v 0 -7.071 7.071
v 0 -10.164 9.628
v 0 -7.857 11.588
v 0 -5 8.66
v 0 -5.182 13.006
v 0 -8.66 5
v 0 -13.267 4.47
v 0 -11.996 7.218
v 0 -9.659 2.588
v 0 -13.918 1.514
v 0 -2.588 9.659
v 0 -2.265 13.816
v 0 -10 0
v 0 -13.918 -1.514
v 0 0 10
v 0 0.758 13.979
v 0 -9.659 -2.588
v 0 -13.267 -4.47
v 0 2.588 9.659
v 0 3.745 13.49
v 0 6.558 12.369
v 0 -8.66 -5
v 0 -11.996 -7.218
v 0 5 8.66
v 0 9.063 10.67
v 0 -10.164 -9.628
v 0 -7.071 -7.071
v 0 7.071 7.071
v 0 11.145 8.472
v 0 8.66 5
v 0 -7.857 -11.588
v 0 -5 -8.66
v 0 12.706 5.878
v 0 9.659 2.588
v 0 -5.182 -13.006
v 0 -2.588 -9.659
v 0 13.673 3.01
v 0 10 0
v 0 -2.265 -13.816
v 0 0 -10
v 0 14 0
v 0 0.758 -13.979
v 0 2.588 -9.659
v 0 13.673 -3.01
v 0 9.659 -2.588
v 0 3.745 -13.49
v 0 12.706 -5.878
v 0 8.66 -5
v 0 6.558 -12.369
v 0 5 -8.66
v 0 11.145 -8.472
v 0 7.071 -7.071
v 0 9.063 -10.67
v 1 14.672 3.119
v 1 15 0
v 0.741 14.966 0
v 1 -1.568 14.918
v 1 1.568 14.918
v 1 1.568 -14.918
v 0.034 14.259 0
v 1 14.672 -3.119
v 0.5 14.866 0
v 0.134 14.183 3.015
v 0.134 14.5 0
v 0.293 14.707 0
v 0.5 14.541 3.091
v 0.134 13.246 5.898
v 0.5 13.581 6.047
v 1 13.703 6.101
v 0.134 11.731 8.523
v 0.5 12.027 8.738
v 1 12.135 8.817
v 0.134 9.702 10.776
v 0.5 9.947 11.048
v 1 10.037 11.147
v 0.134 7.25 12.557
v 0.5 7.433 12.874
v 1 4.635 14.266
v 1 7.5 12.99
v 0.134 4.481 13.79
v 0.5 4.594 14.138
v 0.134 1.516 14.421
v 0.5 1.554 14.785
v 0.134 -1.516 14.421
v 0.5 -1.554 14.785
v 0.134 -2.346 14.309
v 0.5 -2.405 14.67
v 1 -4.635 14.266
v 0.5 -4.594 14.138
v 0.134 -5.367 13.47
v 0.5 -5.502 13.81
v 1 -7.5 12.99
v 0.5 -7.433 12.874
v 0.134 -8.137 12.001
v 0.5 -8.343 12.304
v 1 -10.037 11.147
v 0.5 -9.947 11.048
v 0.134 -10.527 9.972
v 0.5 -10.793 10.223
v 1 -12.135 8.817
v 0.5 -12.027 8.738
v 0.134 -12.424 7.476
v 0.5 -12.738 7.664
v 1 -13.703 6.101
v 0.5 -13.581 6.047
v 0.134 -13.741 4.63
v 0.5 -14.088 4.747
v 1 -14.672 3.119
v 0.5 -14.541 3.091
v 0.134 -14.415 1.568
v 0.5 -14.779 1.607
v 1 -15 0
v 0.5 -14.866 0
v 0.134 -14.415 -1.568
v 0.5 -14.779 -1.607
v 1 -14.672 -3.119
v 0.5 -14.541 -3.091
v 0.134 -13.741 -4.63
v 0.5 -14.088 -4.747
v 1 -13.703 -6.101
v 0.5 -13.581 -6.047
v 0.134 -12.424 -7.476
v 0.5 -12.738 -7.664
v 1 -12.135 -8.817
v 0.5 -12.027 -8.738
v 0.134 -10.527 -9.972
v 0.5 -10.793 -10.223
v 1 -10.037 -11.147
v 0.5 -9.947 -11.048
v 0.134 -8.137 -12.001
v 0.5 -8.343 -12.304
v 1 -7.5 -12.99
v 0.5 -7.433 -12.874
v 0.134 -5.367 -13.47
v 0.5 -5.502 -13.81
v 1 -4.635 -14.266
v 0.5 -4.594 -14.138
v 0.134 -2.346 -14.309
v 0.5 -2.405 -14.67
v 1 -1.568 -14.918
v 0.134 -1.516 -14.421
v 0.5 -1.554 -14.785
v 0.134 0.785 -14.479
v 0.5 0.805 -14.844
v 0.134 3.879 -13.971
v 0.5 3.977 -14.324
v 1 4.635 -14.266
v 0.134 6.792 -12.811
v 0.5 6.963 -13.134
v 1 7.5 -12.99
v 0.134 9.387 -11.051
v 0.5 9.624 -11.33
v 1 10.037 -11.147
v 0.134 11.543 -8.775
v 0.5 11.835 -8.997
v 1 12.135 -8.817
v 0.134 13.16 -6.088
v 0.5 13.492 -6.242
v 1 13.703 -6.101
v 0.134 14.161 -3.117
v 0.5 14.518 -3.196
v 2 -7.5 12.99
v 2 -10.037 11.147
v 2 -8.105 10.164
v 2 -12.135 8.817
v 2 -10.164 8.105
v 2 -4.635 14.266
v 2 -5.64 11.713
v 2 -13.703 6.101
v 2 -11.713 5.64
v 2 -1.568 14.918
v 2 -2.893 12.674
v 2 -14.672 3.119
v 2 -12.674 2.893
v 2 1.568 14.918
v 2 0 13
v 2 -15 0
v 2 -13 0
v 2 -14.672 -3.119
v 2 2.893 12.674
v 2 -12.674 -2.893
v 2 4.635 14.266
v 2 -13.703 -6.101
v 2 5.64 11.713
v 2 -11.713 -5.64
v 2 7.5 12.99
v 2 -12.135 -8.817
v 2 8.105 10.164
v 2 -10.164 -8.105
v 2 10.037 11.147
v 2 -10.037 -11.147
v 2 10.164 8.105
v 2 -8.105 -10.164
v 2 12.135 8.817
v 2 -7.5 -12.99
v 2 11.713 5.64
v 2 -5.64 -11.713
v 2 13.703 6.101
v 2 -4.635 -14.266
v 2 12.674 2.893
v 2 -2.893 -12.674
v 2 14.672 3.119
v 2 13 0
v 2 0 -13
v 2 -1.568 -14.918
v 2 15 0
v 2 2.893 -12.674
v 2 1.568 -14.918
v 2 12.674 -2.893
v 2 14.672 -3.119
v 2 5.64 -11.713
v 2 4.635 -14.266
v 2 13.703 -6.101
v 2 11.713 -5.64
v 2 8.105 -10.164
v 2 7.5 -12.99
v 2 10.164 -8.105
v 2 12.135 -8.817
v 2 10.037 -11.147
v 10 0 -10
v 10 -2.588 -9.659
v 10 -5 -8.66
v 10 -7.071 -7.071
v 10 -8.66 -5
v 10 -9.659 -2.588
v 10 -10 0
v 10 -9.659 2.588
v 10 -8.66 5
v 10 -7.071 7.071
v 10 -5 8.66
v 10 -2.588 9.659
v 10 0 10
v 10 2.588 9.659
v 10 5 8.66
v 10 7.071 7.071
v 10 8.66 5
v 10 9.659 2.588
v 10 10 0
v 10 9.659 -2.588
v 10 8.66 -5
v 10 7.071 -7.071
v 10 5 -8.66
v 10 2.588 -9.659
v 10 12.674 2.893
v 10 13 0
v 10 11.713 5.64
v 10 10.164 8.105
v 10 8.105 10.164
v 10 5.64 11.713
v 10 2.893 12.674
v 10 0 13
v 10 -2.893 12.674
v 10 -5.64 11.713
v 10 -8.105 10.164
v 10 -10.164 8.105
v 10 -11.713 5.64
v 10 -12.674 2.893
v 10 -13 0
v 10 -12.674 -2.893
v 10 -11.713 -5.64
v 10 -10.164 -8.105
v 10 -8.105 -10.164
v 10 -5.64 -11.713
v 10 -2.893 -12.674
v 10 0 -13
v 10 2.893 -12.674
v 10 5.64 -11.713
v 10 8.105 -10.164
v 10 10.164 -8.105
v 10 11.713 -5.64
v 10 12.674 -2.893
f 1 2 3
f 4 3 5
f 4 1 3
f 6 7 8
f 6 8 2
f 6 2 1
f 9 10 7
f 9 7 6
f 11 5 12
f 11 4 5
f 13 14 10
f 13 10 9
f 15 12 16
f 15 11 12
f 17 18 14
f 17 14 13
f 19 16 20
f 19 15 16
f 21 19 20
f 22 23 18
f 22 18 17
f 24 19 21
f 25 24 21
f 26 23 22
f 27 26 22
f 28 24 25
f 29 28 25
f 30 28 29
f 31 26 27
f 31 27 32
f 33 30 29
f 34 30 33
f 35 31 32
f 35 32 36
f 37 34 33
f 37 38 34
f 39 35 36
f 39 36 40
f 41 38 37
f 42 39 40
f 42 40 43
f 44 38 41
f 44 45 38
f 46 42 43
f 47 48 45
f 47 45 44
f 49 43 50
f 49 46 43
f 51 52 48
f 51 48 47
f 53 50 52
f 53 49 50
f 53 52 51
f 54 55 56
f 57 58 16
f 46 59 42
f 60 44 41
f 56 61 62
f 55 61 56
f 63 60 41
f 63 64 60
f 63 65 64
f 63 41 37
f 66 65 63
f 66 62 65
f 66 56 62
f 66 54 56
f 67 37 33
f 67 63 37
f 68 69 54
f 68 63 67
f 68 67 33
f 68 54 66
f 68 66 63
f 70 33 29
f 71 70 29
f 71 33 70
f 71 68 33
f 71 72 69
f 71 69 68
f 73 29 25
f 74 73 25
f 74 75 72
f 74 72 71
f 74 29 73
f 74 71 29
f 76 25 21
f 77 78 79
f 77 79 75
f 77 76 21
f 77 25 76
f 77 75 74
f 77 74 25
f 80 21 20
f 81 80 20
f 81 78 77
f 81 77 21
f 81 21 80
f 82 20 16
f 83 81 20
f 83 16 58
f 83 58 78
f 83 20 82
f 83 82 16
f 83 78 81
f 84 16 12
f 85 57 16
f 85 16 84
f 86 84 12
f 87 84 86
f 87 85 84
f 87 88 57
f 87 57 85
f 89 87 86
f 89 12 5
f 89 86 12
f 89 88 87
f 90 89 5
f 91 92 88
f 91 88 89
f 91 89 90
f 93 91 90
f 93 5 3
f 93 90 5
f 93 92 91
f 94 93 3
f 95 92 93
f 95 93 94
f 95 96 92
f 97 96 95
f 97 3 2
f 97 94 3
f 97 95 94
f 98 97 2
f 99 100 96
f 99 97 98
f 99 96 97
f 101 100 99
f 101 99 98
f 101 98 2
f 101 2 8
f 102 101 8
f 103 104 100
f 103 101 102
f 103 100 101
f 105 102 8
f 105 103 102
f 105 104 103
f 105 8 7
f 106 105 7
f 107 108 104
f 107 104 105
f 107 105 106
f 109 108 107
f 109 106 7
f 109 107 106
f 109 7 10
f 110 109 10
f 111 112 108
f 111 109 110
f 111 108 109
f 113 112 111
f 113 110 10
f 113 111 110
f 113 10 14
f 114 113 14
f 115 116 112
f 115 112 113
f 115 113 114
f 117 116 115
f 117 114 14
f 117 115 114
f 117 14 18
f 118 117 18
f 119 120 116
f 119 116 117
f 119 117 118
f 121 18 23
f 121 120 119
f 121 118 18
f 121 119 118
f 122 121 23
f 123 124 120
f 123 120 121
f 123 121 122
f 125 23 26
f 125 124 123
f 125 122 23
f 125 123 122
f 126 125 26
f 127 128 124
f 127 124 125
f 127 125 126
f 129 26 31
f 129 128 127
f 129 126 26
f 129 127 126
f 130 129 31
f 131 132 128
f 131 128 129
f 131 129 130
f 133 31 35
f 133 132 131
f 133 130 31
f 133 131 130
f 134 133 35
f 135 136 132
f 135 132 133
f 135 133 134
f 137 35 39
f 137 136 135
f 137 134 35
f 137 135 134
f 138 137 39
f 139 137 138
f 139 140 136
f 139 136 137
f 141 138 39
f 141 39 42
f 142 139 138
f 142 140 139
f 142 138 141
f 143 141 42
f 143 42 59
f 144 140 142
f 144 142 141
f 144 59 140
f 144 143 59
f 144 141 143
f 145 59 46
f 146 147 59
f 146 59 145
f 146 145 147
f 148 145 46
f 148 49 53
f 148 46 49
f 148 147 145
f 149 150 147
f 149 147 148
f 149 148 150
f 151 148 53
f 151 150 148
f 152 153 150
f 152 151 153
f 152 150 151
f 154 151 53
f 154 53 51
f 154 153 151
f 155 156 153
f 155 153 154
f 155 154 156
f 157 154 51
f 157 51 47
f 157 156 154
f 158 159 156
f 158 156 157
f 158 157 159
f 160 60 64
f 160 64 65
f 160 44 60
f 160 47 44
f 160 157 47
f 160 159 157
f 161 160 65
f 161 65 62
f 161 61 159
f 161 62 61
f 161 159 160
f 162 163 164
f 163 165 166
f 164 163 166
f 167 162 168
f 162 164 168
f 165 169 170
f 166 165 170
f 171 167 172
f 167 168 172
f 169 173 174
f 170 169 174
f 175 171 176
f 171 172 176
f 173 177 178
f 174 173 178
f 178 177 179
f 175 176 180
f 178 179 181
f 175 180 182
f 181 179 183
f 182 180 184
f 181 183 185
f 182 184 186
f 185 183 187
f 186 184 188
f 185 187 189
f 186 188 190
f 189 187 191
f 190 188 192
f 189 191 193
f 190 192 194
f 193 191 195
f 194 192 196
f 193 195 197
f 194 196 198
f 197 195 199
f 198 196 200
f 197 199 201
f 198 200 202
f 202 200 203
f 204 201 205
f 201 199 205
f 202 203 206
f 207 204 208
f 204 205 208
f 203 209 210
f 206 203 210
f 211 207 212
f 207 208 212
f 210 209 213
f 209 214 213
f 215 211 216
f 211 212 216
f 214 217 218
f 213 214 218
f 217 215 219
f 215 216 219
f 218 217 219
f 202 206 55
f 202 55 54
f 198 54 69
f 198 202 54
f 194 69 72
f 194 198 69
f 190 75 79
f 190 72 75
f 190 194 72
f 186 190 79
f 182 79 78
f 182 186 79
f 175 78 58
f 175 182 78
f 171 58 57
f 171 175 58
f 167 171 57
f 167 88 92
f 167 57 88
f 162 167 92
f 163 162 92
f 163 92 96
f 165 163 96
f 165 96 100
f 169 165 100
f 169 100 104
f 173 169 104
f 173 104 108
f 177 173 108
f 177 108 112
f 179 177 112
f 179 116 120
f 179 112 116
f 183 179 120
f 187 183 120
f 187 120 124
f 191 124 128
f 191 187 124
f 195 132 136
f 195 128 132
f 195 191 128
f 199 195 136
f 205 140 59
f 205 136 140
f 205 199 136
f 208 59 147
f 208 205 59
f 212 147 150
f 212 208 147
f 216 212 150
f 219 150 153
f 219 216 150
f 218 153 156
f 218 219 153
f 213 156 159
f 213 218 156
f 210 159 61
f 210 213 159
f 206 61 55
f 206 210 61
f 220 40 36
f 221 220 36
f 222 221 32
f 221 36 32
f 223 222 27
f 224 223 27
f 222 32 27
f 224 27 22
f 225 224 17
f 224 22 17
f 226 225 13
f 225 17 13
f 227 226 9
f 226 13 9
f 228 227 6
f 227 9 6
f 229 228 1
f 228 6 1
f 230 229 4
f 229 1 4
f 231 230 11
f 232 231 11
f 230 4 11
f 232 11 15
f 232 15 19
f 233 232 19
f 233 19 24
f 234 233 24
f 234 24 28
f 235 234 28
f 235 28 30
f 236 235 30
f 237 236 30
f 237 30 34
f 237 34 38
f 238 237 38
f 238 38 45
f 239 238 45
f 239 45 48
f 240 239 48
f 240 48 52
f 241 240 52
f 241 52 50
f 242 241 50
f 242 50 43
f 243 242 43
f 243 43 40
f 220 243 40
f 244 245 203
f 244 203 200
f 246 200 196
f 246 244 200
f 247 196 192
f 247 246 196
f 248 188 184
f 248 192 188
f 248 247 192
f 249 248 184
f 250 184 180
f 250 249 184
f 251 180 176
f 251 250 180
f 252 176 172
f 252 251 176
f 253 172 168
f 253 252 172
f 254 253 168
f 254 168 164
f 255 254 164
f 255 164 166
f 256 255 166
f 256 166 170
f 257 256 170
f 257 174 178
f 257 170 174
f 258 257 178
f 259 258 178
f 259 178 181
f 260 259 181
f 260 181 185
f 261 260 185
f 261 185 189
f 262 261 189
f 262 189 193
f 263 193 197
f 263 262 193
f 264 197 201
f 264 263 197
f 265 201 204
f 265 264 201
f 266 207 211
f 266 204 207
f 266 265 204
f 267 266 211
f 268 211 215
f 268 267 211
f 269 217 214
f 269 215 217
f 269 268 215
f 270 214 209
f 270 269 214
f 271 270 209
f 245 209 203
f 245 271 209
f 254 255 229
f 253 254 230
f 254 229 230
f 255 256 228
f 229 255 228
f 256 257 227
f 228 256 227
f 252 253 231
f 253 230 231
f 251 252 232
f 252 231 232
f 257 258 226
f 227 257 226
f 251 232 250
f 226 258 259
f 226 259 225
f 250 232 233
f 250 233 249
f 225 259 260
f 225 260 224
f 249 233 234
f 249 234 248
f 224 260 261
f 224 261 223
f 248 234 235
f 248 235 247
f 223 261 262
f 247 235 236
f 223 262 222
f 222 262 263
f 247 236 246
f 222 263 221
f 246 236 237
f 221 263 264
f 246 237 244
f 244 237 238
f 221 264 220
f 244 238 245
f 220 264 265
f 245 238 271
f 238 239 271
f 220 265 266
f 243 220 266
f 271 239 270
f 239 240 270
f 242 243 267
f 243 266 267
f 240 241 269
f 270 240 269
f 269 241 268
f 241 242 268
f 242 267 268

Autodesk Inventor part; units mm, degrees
ref_plane "YZ Plane" through (0, 0, 0) normal (1, 0, 0) x (0, 1, 0)
ref_plane "XZ Plane" through (0, 0, 0) normal (0, 1, 0) x (-1, 0, 0)
ref_plane "XY Plane" through (0, 0, 0) normal (0, 0, 1) x (1, 0, 0)
sketch "Sketch1" plane through (0, 0, 0) normal (0, 0, 1) x (1, 0, 0)
  line L0 (0, 0) -> (0, 15)
  line L1 (0, 15) -> (2, 15)
  line L2 (2, 15) -> (2, 13)
  line L3 (2, 13) -> (10, 13)
  line L4 (10, 13) -> (10, 0)
  line L5 (10, 0) -> (0, 0)
  dimension "d0" = 2
  dimension "d1" = 8
  dimension "d2" = 30
  dimension "d3" = 26
revolve "Revolution1" add sketch "Sketch1" angle 360 about axis through (10, 0, 0) along (-1, 0, 0)
fillet "Fillet1" radius 1 1 edges at (0, -15, 0)
sketch "Sketch2" plane through (10, 0, 0) normal (1, 0, 0) x (0, 0, -1)
  circle A0 centre (0, 0) radius 13 projected
  point P0 (0, 0)
hole "Hole1" at (10, 0, 0) direction (-1, 0, 0) diameter 20 depth 10
properties part number "101 part 3" material "Copper, Alloy"
